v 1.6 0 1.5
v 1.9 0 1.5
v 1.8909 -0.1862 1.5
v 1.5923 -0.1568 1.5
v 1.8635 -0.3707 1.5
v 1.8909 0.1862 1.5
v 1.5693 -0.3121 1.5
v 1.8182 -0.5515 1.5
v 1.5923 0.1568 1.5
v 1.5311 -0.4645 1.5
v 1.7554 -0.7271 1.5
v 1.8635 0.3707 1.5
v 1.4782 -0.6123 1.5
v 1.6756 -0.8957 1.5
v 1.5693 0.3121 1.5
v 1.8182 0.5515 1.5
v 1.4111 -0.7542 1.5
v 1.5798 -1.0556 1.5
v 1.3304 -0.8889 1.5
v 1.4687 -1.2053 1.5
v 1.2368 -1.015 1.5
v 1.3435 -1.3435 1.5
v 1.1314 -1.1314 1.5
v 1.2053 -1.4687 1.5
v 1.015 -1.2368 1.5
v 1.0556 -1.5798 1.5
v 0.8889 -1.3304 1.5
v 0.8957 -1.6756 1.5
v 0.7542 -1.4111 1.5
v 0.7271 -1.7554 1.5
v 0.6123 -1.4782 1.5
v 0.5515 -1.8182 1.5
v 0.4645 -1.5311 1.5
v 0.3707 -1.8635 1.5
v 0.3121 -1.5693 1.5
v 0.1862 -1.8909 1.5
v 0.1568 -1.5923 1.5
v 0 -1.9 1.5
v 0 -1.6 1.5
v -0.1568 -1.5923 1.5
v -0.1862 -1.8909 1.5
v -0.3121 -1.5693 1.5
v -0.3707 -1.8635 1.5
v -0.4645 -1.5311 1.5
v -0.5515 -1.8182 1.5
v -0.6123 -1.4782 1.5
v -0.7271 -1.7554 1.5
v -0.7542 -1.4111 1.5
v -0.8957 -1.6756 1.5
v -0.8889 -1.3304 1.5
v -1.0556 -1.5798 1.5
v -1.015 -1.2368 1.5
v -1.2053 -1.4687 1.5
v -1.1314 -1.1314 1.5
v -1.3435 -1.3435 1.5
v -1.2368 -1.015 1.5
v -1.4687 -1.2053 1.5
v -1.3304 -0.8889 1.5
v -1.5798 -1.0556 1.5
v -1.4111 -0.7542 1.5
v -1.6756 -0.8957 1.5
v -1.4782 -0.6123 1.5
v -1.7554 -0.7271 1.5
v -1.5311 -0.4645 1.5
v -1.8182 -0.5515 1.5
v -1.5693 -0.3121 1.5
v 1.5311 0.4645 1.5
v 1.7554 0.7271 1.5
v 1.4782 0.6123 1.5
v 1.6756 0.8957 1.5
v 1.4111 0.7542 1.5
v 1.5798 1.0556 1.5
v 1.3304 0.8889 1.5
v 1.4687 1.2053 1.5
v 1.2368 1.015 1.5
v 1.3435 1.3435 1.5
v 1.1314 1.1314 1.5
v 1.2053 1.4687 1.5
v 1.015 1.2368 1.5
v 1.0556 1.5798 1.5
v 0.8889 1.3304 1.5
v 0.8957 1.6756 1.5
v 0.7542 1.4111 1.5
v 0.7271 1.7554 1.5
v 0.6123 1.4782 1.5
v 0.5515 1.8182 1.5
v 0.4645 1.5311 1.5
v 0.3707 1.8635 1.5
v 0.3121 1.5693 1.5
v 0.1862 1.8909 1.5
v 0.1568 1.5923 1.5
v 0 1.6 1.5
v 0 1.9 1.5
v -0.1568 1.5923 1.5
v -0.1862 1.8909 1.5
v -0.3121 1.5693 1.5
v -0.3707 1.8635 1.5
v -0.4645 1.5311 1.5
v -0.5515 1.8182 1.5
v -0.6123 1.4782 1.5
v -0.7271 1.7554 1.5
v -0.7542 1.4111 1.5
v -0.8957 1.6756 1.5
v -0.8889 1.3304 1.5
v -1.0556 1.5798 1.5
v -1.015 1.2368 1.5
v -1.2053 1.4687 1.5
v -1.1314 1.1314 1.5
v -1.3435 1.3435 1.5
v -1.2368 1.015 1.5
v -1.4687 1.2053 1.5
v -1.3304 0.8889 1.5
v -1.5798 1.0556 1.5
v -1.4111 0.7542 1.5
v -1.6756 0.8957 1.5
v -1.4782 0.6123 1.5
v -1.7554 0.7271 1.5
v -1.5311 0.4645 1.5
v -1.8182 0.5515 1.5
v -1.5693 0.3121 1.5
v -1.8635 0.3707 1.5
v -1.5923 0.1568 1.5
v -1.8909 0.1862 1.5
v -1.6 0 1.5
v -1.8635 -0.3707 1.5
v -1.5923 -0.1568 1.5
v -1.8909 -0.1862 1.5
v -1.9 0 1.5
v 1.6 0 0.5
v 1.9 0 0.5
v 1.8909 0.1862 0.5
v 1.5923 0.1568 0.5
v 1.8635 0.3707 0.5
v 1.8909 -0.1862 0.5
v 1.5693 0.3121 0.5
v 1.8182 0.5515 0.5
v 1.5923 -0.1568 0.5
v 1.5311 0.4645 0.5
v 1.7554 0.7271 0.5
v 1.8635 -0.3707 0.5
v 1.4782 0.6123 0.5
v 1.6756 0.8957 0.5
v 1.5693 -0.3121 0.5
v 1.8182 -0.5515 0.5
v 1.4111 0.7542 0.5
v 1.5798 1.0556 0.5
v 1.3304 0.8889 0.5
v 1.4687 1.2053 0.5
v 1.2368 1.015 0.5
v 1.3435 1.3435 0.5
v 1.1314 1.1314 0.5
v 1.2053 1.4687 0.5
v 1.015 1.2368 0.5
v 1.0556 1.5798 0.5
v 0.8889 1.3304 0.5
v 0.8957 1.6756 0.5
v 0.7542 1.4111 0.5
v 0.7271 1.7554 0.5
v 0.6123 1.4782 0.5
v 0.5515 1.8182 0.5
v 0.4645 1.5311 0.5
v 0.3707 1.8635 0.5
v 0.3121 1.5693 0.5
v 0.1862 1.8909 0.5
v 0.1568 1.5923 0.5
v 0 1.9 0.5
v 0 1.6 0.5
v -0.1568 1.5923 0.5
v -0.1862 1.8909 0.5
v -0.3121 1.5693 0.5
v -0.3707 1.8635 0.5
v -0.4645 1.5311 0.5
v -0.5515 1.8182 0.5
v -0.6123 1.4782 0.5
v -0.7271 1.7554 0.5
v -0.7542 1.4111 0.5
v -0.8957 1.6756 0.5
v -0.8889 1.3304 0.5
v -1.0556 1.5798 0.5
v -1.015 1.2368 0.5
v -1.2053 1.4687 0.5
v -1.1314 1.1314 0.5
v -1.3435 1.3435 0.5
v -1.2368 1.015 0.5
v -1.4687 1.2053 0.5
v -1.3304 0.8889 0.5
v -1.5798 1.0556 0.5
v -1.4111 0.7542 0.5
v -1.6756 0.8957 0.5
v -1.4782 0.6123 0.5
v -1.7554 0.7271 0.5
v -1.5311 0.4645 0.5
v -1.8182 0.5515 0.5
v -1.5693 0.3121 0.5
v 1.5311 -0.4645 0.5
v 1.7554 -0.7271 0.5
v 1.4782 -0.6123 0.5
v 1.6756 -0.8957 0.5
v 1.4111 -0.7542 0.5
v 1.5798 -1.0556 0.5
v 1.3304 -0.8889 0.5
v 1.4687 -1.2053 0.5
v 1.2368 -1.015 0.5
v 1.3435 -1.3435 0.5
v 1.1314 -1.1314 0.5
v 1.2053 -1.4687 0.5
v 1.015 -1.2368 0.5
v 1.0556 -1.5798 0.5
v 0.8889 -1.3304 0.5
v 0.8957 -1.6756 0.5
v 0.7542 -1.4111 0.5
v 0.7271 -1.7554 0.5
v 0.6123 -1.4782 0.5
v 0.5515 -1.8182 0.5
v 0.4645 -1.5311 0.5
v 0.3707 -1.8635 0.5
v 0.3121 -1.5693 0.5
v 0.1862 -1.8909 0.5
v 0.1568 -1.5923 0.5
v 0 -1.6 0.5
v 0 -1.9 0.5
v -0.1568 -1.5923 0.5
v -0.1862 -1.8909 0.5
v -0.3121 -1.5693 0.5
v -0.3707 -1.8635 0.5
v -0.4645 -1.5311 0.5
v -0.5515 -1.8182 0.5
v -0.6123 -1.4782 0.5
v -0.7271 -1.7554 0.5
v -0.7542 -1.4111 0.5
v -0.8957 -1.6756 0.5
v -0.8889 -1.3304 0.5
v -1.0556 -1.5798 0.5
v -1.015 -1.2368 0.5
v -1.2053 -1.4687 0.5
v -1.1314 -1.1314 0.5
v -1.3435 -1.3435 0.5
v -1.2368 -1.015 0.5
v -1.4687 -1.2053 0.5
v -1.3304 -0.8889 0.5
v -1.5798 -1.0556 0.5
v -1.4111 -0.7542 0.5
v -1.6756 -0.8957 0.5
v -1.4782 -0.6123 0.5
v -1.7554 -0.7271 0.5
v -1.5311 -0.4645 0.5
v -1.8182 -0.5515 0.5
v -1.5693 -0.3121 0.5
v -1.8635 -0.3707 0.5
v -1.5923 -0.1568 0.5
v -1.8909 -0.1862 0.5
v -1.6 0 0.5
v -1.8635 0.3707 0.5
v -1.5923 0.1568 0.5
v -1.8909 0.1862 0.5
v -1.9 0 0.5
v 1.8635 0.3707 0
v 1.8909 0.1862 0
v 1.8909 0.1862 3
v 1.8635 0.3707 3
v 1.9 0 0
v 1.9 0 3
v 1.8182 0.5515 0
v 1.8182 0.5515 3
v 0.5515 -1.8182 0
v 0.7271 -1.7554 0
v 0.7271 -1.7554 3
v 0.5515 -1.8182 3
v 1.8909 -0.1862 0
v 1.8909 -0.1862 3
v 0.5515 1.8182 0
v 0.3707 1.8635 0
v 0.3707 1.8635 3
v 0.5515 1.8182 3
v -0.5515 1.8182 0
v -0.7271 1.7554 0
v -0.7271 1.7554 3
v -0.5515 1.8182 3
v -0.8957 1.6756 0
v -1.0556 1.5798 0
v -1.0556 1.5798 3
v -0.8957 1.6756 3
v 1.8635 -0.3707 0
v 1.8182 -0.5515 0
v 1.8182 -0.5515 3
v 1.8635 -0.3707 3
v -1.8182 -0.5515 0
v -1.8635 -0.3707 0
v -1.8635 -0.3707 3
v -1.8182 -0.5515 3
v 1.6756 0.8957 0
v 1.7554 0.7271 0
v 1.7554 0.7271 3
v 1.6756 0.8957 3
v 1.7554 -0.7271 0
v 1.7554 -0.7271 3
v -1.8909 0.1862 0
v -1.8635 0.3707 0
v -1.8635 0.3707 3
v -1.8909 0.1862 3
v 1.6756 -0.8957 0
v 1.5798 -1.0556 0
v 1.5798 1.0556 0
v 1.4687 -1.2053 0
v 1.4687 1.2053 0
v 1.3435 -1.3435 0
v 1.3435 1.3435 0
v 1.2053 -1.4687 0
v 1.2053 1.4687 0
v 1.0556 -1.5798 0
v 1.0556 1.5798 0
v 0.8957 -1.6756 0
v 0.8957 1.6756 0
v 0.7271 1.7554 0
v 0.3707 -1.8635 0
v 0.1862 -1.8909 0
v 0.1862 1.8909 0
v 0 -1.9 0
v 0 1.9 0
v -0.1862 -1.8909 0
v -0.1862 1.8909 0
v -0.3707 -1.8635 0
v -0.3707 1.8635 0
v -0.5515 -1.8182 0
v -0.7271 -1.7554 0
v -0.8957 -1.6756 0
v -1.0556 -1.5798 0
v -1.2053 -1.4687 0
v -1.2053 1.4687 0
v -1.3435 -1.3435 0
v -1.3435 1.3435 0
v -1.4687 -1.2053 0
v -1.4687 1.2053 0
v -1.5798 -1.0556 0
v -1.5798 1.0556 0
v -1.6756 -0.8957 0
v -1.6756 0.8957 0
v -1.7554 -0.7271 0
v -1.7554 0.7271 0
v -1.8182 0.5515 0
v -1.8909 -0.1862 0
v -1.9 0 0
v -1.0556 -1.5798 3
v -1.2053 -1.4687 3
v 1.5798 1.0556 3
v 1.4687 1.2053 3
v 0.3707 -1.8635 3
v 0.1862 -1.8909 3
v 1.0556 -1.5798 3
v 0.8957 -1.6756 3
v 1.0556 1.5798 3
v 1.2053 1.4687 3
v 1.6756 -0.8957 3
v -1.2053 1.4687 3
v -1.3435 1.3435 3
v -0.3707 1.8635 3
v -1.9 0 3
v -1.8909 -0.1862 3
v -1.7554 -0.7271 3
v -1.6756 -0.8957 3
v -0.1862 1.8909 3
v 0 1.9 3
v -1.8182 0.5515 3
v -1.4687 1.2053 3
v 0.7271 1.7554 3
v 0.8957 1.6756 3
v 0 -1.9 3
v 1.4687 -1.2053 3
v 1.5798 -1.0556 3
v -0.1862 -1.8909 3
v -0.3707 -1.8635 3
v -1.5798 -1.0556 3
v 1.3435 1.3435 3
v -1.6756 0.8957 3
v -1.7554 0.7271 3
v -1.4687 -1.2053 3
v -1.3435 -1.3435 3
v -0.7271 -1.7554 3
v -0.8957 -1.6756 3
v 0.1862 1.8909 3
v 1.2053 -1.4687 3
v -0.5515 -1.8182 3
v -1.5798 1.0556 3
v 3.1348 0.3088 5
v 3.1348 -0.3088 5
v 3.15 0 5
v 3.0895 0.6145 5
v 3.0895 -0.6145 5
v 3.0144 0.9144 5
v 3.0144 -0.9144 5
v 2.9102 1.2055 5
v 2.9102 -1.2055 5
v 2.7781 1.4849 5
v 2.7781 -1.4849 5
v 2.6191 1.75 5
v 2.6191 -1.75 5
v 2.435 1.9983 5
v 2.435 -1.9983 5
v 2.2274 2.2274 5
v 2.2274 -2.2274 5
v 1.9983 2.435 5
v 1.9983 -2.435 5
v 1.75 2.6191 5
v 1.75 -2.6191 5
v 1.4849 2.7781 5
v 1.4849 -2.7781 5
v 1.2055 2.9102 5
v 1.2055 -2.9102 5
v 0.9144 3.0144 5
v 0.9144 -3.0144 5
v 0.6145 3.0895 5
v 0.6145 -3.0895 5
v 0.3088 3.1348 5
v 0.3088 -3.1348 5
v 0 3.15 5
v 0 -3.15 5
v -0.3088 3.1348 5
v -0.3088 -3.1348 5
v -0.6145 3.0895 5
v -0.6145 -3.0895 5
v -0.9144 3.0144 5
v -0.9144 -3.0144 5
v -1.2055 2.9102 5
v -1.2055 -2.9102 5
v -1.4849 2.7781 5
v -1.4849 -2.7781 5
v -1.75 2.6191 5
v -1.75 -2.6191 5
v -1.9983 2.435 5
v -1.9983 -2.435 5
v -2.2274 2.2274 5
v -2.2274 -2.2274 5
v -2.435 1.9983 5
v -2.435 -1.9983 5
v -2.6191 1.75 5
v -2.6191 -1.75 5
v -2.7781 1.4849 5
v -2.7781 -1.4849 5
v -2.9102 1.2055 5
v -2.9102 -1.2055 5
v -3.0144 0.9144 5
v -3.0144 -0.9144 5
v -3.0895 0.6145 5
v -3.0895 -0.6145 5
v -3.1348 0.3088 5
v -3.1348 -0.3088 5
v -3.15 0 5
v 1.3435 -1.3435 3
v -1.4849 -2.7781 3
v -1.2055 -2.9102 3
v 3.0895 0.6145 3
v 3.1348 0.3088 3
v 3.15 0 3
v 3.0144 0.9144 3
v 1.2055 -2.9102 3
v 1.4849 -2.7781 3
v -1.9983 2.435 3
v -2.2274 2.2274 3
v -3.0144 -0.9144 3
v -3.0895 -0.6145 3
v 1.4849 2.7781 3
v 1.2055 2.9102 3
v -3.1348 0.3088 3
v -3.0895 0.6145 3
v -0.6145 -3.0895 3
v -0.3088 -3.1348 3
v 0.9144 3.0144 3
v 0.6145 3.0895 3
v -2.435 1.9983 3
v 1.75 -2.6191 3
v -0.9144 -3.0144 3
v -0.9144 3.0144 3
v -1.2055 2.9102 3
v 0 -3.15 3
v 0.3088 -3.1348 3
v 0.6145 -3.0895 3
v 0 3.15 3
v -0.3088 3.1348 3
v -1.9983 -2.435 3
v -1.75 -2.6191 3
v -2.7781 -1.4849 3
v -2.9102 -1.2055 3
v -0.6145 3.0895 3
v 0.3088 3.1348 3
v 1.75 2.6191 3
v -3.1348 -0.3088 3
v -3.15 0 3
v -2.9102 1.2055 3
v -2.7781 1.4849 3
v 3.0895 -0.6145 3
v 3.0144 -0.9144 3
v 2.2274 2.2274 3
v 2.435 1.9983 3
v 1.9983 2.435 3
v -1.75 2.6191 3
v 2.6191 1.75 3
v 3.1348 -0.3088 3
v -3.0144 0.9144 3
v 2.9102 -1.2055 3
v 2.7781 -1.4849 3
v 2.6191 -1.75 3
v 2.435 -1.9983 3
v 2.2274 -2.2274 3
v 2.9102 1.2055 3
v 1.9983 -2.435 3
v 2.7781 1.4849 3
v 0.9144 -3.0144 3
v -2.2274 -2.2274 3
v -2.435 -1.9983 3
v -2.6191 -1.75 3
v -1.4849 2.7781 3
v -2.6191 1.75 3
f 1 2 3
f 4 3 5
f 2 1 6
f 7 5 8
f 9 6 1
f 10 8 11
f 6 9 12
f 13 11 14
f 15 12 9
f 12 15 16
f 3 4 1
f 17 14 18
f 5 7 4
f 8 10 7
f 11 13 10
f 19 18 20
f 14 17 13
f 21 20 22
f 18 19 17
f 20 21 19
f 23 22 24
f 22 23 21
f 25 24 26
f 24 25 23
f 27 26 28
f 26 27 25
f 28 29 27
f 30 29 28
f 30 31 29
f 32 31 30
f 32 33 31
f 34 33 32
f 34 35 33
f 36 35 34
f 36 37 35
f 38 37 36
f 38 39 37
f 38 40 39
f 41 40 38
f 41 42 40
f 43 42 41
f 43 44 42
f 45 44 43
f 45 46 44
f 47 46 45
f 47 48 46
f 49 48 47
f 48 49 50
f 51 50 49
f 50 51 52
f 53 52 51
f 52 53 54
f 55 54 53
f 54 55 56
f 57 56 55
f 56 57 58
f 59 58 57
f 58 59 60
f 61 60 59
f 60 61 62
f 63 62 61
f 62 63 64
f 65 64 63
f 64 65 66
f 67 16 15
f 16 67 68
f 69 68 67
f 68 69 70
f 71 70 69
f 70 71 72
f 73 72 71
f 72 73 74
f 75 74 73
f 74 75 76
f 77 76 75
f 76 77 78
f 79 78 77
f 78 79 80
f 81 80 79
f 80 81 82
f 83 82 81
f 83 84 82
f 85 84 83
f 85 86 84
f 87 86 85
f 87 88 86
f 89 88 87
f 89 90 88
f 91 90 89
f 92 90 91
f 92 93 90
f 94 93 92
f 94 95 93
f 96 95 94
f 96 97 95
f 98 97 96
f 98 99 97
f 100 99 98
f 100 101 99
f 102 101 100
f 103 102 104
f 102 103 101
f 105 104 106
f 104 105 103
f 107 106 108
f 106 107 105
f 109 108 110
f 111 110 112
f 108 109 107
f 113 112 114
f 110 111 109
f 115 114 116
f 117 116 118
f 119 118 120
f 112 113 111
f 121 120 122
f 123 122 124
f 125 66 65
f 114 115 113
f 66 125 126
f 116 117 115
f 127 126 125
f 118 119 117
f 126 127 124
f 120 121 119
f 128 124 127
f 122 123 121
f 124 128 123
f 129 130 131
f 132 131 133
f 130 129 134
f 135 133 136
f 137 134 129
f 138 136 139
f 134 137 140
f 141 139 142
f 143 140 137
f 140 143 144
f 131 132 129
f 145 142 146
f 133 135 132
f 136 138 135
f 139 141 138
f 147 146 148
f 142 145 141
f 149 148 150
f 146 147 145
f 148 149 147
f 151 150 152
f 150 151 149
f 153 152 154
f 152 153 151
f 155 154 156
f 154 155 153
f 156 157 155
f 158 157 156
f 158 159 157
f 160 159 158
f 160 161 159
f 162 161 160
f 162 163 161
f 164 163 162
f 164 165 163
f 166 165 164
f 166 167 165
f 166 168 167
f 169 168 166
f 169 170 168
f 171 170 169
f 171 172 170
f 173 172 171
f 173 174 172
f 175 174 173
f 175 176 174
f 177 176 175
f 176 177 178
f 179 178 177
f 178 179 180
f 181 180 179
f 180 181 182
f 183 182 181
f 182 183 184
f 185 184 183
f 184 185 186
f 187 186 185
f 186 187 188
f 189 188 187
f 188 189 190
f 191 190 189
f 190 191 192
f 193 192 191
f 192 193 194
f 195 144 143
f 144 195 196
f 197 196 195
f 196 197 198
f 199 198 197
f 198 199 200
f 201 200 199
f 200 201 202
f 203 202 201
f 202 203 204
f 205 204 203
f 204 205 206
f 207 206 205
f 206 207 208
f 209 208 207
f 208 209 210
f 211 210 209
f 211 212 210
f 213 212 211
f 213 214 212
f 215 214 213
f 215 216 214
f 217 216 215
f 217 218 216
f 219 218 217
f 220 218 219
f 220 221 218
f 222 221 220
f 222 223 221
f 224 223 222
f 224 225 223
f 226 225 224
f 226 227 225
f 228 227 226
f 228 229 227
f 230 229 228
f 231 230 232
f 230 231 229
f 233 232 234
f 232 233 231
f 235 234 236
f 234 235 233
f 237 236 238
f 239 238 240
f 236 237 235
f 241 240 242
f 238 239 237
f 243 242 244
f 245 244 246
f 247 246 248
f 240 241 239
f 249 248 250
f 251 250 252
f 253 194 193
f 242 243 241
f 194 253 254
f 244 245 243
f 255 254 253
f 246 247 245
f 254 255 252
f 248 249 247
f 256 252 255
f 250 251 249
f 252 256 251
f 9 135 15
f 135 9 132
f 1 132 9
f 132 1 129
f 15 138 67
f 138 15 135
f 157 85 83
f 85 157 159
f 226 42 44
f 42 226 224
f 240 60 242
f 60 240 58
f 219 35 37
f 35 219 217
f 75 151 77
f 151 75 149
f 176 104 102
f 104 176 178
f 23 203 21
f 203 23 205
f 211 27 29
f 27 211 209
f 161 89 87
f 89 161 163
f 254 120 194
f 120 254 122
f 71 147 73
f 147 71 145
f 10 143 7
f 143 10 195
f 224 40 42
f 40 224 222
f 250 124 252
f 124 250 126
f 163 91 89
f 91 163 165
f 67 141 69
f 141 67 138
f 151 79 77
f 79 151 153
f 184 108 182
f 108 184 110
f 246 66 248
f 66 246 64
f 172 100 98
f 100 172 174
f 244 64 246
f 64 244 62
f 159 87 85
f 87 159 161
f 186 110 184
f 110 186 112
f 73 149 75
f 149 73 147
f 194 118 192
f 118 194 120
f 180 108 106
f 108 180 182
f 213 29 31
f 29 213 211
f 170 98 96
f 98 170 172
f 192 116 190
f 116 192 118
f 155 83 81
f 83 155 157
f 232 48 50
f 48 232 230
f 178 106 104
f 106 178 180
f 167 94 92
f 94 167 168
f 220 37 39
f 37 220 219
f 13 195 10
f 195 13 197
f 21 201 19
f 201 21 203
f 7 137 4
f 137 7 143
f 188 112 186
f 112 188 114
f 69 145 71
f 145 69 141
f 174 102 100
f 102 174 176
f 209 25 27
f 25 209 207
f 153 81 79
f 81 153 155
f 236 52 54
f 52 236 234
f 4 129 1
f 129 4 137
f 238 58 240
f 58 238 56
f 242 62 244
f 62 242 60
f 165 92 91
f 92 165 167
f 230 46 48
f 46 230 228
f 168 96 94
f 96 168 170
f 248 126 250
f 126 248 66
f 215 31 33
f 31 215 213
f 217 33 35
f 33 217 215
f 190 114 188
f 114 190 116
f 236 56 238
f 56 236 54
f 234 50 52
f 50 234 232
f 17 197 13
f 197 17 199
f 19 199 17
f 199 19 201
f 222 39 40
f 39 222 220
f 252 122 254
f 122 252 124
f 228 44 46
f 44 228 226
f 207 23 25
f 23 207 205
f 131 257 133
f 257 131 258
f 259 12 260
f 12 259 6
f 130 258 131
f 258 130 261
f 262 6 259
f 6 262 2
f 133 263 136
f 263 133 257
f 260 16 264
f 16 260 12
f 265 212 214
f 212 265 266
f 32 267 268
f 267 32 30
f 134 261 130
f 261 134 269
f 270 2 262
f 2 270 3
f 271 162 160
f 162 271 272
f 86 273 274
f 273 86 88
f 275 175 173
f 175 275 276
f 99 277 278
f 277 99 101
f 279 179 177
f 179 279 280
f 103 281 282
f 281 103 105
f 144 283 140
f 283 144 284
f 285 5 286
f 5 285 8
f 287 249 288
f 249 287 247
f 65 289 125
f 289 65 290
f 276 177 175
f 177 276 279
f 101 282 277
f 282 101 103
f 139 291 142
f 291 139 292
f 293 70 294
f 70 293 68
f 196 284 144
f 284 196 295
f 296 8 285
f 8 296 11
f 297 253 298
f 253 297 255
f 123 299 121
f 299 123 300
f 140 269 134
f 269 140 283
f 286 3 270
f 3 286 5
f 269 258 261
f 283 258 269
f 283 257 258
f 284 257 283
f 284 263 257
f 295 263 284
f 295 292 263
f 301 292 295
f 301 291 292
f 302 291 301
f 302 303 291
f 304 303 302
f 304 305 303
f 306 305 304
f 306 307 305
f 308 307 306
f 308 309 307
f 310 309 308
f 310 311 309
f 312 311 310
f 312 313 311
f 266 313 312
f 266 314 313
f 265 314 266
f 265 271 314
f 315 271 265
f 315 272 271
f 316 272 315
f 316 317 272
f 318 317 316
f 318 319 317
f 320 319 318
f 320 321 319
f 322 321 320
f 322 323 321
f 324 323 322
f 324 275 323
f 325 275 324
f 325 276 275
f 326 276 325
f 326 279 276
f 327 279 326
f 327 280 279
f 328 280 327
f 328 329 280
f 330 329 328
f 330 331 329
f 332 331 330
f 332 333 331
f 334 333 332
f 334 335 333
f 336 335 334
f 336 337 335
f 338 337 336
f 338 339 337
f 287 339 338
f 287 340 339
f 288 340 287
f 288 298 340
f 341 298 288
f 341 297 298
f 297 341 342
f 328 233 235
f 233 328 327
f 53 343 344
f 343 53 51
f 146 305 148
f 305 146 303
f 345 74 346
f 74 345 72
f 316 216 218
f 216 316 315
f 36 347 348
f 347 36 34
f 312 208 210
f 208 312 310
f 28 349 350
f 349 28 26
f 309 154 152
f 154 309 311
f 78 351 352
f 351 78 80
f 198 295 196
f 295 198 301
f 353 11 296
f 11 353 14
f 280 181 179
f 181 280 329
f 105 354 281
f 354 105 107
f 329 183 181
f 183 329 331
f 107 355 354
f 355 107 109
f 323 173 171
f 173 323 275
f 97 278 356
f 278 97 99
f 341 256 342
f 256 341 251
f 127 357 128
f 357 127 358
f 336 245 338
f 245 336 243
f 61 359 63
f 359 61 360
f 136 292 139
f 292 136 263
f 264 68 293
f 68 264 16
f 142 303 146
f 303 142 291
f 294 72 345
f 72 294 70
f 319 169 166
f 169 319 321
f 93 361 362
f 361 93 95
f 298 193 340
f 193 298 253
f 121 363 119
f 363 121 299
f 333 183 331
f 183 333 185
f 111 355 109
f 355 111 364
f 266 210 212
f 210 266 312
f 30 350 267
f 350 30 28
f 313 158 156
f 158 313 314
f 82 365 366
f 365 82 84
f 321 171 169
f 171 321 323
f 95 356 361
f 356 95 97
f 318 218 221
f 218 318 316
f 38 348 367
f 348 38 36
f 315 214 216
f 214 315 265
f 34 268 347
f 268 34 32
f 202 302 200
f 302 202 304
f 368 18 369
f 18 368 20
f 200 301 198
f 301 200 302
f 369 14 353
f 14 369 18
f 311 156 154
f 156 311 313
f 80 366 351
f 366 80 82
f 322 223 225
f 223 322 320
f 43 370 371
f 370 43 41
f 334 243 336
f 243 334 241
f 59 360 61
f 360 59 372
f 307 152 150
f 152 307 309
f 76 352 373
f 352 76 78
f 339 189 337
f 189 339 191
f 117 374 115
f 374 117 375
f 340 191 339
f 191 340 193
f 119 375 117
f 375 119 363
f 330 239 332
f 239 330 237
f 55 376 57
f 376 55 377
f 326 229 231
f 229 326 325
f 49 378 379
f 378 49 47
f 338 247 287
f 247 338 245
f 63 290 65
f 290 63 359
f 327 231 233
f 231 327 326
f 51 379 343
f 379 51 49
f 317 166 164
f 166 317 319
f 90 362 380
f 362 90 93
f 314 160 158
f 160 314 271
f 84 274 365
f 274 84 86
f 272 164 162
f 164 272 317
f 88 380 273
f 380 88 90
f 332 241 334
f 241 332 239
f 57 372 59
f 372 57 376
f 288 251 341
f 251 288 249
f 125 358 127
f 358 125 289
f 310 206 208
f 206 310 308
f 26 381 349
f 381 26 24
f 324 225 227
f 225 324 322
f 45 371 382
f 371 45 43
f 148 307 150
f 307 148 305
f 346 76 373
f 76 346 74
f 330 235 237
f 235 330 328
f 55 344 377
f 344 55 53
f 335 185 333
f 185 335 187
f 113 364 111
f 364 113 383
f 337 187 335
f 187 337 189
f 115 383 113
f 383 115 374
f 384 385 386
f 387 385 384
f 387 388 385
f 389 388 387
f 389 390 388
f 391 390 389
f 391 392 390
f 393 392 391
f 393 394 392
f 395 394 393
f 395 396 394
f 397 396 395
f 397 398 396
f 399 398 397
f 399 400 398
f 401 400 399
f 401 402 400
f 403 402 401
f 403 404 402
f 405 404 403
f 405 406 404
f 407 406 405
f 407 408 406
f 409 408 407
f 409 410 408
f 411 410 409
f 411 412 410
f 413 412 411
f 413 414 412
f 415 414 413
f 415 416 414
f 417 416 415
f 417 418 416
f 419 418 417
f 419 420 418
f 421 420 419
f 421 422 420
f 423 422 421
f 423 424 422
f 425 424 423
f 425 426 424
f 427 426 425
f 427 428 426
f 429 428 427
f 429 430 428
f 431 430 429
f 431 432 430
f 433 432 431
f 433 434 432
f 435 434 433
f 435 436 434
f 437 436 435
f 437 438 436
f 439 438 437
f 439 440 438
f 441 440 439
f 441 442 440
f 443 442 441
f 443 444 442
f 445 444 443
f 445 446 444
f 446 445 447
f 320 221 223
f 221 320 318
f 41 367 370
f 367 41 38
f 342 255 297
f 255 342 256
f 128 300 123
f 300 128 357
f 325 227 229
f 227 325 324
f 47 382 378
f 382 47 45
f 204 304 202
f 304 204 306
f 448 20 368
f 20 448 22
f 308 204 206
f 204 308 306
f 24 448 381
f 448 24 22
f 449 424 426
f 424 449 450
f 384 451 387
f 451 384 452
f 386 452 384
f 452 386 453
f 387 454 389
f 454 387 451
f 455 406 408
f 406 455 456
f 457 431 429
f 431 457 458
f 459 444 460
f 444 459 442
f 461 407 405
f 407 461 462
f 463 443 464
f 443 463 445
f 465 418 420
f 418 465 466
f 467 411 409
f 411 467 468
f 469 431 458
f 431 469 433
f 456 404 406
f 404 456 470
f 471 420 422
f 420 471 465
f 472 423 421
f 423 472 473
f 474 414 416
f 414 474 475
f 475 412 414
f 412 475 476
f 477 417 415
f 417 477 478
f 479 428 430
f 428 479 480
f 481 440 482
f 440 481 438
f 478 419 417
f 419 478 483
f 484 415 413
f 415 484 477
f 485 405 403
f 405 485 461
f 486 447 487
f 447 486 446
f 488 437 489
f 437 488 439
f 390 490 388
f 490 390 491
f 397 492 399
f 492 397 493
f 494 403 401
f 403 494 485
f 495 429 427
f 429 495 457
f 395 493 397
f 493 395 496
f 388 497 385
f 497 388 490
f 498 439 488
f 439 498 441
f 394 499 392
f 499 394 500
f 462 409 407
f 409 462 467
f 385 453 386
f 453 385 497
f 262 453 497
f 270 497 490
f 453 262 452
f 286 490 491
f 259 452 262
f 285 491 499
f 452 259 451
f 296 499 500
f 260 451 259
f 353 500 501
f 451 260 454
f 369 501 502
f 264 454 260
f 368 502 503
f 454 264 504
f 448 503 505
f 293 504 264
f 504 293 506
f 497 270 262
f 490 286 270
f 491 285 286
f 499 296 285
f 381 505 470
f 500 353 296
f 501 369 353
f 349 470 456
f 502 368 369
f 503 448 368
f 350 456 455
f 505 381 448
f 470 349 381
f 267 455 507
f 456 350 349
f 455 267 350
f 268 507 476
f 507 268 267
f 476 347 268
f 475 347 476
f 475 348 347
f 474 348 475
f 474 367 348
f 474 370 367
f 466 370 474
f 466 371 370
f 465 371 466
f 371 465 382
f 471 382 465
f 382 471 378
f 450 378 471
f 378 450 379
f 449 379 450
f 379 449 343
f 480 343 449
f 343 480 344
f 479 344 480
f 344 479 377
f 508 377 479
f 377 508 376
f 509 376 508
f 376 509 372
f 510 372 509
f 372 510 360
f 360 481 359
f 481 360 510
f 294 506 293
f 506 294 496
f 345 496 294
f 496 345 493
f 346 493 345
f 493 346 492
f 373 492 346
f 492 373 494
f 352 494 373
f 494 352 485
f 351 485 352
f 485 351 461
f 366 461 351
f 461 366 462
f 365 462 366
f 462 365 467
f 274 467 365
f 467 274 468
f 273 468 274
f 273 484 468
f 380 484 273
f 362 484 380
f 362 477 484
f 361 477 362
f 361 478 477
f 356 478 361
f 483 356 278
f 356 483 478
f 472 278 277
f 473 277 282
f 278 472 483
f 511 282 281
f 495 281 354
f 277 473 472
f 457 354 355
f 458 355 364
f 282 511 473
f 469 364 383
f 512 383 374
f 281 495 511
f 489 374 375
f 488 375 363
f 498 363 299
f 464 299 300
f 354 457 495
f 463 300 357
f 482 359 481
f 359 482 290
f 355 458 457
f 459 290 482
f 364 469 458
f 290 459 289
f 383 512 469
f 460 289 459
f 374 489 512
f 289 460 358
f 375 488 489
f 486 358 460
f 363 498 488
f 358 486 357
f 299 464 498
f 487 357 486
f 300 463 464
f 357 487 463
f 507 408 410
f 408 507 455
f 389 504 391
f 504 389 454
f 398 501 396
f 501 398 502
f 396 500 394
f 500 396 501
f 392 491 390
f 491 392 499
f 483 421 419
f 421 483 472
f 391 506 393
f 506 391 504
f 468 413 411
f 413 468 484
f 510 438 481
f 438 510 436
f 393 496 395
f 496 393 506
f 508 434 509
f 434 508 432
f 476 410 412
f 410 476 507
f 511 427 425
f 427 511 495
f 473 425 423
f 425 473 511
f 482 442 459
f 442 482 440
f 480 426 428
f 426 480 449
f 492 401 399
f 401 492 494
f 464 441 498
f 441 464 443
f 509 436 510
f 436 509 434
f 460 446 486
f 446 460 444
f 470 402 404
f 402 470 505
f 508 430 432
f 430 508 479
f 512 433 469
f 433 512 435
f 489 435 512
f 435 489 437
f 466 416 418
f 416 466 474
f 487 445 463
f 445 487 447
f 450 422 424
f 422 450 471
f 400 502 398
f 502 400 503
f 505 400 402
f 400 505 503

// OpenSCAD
//
// test pegs for self-anchoring in TPU85 mesh
//
$fn = 64;
e = 0.1;

hex_thk = 1.0;			/* hex mesh printed thickness */
gpeg_dia = 3.8;			/* grommet peg diameter (currently 3.0) */
gdet_hole_dia = 3.2;		/* hole in mesh */
// center "rivet" peg
gpeg_len = 5;
groove_offset = 0.5;
groove_dia = gdet_hole_dia;
groove_wid = hex_thk;
g_shoulder = 2;		/* shoulder to support mesh */

// from grommet.scad
// generate a (positive) groove geometry for a McMaster clip
module clip_groove( dia, wid) {
  difference() {
    cylinder( h=wid, d=dia+3);
    translate( [0, 0, -e])
      cylinder( h=wid+2*e, d=dia);
  }
}

module apeg( p_dia, p_len, g_offset, g_dia, g_wid)
{
     difference() {
	  cylinder( d=p_dia, h=p_len);
	  translate( [0, 0, g_offset])
	       clip_groove( g_dia, g_wid);
     }
     translate( [0, 0, p_len-g_shoulder])
     cylinder( d=p_dia+2.5, h=g_shoulder);
}

//apeg(gpeg_dia, gpeg_len, groove_offset, groove_dia, groove_wid);

// try some different sizes

//    diam   len    offset  G dia  g wid
apeg( 3.8,    5,    0.5,    3.2,   1);
// translate( [10, 0, 0])
// apeg( 4.0,    5,    0.5,    3.4,   1);
// translate( [20, 0, 0])
// apeg( 4.2,    5,    0.5,    3.6,   1);
// translate( [30, 0, 0])
// apeg( 4.4,    5,    0.5,    3.8,   1);
// 
// translate( [-3.5, -3.5, 4.5])
// cube( [38, 7, 1]);
